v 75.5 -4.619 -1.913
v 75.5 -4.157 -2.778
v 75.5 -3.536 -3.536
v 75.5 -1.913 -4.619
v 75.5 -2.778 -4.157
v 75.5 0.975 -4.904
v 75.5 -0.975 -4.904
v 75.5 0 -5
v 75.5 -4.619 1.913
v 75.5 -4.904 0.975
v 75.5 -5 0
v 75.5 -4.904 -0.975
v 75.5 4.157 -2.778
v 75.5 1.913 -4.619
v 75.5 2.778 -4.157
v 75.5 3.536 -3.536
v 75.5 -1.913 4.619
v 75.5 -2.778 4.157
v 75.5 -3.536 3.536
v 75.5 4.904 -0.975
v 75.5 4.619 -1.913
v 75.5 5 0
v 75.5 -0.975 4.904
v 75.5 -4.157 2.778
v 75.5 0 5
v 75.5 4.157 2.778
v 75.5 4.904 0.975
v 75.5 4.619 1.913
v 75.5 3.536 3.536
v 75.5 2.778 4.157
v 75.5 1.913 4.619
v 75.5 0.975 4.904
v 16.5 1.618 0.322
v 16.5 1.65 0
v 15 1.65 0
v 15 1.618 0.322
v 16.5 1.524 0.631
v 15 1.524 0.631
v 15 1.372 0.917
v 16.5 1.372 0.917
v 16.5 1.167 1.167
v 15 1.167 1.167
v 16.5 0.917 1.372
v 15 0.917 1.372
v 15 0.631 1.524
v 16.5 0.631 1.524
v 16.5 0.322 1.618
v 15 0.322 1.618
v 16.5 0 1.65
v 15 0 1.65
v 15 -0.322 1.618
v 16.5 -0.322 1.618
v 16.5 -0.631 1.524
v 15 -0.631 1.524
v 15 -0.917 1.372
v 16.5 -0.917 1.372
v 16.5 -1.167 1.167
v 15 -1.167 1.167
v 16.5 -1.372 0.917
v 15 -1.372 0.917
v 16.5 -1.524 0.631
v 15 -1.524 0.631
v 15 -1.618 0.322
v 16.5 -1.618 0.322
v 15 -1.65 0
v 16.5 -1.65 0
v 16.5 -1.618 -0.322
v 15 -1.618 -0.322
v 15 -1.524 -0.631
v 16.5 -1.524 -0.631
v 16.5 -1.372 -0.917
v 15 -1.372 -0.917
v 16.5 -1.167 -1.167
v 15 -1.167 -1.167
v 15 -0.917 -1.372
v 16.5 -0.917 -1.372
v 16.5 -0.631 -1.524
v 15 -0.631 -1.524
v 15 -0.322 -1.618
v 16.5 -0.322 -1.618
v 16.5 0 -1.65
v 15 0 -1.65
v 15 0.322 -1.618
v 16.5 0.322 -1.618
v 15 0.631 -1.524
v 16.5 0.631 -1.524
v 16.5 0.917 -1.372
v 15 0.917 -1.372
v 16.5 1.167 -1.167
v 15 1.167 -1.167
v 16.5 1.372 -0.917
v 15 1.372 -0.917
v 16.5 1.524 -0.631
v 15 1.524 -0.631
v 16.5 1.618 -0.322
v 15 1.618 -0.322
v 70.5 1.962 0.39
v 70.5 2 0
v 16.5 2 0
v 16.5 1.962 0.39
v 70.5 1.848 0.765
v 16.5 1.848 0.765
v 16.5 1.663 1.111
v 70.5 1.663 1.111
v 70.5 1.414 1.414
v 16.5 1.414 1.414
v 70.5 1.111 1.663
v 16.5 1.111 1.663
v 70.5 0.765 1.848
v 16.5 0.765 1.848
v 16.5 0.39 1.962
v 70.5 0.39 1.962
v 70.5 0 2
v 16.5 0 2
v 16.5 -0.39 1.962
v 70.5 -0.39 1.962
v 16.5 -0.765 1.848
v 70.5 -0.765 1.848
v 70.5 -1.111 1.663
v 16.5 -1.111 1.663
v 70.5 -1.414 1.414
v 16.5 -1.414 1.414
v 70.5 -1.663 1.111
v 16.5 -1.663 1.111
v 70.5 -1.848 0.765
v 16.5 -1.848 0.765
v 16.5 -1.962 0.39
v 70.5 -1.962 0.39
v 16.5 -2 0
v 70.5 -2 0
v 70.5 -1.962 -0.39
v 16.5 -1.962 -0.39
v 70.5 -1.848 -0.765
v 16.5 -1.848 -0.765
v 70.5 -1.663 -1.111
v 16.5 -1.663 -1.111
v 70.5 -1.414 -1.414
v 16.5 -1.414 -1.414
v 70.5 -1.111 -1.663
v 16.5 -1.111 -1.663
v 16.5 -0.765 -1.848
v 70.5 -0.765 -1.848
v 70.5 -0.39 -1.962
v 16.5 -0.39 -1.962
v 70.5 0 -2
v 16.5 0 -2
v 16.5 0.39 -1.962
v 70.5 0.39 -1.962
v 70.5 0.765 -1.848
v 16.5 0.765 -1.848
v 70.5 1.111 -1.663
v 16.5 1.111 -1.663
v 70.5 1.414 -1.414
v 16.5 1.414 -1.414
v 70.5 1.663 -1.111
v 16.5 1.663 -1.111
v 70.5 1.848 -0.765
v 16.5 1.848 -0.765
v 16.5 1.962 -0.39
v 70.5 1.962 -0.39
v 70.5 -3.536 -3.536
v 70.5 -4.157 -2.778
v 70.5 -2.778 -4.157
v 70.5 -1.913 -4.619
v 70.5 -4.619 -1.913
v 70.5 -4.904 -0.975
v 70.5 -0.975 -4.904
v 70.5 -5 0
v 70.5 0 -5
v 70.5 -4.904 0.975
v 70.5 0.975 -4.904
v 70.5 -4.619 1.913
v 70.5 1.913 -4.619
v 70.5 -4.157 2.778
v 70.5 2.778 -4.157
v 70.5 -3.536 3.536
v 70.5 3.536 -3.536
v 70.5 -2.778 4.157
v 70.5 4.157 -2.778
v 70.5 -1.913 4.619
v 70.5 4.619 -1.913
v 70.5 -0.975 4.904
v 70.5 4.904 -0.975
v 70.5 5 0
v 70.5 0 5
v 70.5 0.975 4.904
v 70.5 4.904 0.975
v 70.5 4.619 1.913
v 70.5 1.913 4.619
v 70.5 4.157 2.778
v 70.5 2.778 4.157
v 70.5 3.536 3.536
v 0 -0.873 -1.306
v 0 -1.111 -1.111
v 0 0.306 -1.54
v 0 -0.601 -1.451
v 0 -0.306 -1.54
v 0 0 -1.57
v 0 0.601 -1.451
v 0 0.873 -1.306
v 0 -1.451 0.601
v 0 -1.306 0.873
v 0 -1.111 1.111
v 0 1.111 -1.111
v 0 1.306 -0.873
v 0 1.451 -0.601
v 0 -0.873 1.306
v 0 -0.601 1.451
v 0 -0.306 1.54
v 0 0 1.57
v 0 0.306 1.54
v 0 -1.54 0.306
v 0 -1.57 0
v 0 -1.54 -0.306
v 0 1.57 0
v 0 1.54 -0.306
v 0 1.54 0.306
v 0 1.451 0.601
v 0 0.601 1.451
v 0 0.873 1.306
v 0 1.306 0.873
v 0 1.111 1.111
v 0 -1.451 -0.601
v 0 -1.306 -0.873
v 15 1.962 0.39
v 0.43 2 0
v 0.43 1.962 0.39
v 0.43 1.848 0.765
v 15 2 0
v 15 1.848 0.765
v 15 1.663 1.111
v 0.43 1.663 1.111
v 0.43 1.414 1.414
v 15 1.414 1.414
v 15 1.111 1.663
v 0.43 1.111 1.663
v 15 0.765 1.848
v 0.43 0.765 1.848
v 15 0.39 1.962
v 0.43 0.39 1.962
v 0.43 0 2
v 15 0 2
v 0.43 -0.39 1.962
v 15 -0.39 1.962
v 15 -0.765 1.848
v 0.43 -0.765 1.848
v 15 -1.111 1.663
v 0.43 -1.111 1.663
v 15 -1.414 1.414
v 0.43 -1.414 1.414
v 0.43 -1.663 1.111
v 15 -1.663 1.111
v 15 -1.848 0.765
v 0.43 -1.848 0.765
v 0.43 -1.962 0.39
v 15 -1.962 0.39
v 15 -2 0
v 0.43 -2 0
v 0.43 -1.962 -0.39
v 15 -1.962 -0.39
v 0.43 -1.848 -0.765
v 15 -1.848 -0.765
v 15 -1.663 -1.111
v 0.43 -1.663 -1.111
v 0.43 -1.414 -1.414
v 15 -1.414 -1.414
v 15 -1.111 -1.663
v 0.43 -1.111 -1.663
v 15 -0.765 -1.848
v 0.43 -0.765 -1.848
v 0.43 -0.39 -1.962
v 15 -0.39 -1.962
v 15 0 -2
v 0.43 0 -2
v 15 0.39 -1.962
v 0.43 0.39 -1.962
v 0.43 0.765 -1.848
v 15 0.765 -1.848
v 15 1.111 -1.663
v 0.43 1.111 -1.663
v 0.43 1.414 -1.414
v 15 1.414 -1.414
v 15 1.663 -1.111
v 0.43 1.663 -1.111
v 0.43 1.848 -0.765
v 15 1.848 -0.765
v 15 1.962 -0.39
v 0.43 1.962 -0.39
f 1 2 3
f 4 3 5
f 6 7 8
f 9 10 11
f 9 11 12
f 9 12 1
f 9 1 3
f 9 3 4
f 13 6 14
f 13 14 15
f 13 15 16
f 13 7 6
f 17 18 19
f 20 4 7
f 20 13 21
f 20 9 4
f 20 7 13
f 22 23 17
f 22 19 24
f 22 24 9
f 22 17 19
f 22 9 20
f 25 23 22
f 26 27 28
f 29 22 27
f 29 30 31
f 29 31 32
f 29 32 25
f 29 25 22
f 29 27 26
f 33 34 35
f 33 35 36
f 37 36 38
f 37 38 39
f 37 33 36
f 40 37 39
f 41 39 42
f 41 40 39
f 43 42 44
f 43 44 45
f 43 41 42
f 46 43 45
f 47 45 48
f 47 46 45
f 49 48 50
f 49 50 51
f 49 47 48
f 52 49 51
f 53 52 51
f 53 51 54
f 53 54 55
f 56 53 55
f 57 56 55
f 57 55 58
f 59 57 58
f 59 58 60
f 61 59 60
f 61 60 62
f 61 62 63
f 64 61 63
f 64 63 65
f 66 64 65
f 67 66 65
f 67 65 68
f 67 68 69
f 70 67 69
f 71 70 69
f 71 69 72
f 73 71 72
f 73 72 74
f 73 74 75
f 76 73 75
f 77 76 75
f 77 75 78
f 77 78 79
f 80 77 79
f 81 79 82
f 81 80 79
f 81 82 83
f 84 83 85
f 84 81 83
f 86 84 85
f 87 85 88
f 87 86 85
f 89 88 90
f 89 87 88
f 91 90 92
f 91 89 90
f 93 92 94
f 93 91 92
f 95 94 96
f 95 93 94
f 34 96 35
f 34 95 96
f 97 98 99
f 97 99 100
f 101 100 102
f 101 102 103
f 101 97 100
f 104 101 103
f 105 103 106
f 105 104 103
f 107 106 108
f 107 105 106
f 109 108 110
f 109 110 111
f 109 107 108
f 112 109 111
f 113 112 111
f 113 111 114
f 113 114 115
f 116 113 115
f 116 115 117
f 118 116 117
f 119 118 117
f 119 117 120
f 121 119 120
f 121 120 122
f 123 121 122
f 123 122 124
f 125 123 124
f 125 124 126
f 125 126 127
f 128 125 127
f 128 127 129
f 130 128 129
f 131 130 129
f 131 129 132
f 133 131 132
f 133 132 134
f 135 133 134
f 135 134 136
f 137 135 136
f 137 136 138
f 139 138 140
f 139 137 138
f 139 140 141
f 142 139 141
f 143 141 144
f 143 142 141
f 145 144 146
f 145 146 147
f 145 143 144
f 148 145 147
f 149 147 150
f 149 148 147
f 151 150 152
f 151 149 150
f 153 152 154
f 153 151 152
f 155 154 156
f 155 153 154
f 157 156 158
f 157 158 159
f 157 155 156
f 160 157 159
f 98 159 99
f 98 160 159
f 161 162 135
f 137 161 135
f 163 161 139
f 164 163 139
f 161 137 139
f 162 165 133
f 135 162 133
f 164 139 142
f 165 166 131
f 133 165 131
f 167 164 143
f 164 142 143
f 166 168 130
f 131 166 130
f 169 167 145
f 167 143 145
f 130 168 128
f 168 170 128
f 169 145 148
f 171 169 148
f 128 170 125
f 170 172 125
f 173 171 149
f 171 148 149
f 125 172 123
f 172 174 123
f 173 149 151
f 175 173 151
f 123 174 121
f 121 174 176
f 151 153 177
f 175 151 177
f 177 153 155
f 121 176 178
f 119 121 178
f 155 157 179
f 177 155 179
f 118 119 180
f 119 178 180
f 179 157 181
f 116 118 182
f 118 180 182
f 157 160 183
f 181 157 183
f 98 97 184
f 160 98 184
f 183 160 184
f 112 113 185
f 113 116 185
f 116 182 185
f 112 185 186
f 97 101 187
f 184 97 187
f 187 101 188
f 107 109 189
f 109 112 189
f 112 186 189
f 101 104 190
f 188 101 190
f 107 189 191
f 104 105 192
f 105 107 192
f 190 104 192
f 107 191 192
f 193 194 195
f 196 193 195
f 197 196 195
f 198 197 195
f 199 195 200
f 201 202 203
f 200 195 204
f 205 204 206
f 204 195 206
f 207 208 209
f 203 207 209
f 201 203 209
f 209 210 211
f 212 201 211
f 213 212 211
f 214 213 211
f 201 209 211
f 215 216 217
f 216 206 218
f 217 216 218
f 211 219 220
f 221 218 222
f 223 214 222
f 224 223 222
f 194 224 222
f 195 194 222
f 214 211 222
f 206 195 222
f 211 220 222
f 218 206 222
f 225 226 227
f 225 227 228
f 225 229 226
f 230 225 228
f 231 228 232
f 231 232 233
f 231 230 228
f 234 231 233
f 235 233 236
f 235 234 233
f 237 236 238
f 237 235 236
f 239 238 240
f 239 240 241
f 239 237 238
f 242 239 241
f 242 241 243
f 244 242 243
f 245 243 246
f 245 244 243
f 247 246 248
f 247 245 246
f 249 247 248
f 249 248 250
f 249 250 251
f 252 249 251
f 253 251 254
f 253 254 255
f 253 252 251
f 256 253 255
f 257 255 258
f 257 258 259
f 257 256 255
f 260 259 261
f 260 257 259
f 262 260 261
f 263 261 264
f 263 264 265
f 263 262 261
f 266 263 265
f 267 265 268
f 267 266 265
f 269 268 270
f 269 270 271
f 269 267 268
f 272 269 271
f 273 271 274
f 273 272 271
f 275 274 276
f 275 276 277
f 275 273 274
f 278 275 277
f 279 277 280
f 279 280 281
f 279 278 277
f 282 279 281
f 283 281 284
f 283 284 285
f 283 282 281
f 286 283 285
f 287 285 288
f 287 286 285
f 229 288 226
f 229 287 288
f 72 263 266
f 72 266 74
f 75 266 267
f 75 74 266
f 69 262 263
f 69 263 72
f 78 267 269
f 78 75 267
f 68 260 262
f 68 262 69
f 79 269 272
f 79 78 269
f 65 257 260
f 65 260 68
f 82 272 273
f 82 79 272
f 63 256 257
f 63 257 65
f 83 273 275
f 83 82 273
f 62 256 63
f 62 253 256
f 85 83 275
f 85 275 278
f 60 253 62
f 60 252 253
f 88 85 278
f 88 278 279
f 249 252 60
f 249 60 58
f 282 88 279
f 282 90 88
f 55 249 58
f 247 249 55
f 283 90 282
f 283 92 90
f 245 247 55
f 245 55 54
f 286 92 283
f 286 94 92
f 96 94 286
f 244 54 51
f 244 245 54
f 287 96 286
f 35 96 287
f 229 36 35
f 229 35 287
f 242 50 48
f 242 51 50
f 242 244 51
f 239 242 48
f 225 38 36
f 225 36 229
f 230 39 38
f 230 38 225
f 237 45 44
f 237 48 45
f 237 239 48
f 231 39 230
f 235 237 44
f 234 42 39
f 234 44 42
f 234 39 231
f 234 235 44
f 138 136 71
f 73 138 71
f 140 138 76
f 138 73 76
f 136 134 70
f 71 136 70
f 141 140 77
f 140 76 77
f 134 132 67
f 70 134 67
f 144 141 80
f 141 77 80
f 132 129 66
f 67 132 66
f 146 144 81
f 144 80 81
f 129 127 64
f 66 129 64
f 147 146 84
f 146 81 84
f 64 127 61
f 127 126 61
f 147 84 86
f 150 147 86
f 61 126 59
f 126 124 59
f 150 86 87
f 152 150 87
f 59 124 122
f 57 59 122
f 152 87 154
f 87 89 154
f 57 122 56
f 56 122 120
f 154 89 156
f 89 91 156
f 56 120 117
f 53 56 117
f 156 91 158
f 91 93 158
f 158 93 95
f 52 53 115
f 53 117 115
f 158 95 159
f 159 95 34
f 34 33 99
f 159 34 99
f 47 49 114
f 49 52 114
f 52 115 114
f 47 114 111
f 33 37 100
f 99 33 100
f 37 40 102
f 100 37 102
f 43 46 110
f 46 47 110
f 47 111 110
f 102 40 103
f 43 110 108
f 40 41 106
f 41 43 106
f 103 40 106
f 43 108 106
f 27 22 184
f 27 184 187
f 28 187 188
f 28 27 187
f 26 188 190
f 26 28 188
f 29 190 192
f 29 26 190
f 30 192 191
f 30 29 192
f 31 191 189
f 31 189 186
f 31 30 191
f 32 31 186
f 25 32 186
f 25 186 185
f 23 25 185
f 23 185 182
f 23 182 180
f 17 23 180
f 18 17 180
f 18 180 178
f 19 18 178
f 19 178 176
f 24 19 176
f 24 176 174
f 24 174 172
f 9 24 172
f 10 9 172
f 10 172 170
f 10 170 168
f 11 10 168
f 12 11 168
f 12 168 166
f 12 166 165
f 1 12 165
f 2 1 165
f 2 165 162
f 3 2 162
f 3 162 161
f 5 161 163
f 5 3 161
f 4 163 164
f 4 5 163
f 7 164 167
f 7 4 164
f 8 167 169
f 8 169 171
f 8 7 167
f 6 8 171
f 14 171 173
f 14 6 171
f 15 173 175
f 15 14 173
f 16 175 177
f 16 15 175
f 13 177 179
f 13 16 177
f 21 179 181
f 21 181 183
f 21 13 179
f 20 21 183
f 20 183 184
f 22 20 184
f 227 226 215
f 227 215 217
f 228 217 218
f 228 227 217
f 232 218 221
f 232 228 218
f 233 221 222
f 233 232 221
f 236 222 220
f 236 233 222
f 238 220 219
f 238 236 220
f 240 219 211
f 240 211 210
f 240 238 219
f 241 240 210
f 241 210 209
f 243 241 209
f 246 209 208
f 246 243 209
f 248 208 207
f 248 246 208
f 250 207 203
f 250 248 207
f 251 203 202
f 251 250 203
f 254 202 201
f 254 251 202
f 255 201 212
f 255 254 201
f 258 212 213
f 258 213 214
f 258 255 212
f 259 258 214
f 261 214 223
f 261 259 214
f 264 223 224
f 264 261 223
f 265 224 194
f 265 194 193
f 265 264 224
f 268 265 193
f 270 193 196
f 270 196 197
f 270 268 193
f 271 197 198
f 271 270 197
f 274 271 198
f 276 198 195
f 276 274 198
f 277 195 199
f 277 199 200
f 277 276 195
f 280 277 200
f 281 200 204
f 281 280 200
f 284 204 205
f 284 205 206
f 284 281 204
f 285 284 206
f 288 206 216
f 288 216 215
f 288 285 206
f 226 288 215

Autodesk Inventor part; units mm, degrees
sketch "Sketch_2" plane through (0, 0, 0) normal (0, 0, 1) x (1, 0, 0)
  line L0 (75.5, 0) -> (0, 0)
  line L1 (0, 0) -> (0, 1.5705)
  line L2 (0, 1.5705) -> (0.4295, 2)
  line L3 (0.4295, 2) -> (15, 2)
  line L4 (15, 2) -> (15, 1.65)
  line L5 (15, 1.65) -> (16.5, 1.65)
  line L6 (16.5, 1.65) -> (16.5, 2)
  line L7 (16.5, 2) -> (70.5, 2)
  line L8 (70.5, 2) -> (70.5, 5)
  line L9 (70.5, 5) -> (75.5, 5)
  line L10 (75.5, 5) -> (75.5, 0)
  line L11 (75.5, 0) -> (0, 0)
revolve "Revolution1" add sketch "Sketch_2" angle 360 about axis through (75.5, 0, 0) along (1, 0, 0)
thread "Thread1" size "M4x0.7" class "6g" standard "ISO Metric profile" full length
ref_plane "ROD_BA_XY" through (8, 0, 0) normal (-1, 0, 0) x (0, 0, -1)
ref_plane "ROD_BA_YZ" through (8, 0, 0) normal (0, 0, -1) x (0, -1, 0)
ref_plane "ROD_BA_ZX" through (8, 0, 0) normal (0, -1, 0) x (-1, 0, 0)
ref_plane "ROD_BODY_XY" through (28, 0, 0) normal (1, 0, 0) x (0, 0, -1)
ref_plane "ROD_BODY_YZ" through (28, 0, 0) normal (0, 0, -1) x (0, 1, 0)
ref_plane "ROD_BODY_ZX" through (28, 0, 0) normal (0, 1, 0) x (1, 0, 0)
ref_plane "rodnt1_XY" through (7.5, 0, 0) normal (1, 0, 0) x (0, 0, -1)
ref_plane "rodnt1_YZ" through (7.5, 0, 0) normal (0, 0, -1) x (0, 1, 0)
ref_plane "rodnt1_ZX" through (7.5, 0, 0) normal (0, 1, 0) x (1, 0, 0)
properties part number "CJ2D10-30Z_ROD"
